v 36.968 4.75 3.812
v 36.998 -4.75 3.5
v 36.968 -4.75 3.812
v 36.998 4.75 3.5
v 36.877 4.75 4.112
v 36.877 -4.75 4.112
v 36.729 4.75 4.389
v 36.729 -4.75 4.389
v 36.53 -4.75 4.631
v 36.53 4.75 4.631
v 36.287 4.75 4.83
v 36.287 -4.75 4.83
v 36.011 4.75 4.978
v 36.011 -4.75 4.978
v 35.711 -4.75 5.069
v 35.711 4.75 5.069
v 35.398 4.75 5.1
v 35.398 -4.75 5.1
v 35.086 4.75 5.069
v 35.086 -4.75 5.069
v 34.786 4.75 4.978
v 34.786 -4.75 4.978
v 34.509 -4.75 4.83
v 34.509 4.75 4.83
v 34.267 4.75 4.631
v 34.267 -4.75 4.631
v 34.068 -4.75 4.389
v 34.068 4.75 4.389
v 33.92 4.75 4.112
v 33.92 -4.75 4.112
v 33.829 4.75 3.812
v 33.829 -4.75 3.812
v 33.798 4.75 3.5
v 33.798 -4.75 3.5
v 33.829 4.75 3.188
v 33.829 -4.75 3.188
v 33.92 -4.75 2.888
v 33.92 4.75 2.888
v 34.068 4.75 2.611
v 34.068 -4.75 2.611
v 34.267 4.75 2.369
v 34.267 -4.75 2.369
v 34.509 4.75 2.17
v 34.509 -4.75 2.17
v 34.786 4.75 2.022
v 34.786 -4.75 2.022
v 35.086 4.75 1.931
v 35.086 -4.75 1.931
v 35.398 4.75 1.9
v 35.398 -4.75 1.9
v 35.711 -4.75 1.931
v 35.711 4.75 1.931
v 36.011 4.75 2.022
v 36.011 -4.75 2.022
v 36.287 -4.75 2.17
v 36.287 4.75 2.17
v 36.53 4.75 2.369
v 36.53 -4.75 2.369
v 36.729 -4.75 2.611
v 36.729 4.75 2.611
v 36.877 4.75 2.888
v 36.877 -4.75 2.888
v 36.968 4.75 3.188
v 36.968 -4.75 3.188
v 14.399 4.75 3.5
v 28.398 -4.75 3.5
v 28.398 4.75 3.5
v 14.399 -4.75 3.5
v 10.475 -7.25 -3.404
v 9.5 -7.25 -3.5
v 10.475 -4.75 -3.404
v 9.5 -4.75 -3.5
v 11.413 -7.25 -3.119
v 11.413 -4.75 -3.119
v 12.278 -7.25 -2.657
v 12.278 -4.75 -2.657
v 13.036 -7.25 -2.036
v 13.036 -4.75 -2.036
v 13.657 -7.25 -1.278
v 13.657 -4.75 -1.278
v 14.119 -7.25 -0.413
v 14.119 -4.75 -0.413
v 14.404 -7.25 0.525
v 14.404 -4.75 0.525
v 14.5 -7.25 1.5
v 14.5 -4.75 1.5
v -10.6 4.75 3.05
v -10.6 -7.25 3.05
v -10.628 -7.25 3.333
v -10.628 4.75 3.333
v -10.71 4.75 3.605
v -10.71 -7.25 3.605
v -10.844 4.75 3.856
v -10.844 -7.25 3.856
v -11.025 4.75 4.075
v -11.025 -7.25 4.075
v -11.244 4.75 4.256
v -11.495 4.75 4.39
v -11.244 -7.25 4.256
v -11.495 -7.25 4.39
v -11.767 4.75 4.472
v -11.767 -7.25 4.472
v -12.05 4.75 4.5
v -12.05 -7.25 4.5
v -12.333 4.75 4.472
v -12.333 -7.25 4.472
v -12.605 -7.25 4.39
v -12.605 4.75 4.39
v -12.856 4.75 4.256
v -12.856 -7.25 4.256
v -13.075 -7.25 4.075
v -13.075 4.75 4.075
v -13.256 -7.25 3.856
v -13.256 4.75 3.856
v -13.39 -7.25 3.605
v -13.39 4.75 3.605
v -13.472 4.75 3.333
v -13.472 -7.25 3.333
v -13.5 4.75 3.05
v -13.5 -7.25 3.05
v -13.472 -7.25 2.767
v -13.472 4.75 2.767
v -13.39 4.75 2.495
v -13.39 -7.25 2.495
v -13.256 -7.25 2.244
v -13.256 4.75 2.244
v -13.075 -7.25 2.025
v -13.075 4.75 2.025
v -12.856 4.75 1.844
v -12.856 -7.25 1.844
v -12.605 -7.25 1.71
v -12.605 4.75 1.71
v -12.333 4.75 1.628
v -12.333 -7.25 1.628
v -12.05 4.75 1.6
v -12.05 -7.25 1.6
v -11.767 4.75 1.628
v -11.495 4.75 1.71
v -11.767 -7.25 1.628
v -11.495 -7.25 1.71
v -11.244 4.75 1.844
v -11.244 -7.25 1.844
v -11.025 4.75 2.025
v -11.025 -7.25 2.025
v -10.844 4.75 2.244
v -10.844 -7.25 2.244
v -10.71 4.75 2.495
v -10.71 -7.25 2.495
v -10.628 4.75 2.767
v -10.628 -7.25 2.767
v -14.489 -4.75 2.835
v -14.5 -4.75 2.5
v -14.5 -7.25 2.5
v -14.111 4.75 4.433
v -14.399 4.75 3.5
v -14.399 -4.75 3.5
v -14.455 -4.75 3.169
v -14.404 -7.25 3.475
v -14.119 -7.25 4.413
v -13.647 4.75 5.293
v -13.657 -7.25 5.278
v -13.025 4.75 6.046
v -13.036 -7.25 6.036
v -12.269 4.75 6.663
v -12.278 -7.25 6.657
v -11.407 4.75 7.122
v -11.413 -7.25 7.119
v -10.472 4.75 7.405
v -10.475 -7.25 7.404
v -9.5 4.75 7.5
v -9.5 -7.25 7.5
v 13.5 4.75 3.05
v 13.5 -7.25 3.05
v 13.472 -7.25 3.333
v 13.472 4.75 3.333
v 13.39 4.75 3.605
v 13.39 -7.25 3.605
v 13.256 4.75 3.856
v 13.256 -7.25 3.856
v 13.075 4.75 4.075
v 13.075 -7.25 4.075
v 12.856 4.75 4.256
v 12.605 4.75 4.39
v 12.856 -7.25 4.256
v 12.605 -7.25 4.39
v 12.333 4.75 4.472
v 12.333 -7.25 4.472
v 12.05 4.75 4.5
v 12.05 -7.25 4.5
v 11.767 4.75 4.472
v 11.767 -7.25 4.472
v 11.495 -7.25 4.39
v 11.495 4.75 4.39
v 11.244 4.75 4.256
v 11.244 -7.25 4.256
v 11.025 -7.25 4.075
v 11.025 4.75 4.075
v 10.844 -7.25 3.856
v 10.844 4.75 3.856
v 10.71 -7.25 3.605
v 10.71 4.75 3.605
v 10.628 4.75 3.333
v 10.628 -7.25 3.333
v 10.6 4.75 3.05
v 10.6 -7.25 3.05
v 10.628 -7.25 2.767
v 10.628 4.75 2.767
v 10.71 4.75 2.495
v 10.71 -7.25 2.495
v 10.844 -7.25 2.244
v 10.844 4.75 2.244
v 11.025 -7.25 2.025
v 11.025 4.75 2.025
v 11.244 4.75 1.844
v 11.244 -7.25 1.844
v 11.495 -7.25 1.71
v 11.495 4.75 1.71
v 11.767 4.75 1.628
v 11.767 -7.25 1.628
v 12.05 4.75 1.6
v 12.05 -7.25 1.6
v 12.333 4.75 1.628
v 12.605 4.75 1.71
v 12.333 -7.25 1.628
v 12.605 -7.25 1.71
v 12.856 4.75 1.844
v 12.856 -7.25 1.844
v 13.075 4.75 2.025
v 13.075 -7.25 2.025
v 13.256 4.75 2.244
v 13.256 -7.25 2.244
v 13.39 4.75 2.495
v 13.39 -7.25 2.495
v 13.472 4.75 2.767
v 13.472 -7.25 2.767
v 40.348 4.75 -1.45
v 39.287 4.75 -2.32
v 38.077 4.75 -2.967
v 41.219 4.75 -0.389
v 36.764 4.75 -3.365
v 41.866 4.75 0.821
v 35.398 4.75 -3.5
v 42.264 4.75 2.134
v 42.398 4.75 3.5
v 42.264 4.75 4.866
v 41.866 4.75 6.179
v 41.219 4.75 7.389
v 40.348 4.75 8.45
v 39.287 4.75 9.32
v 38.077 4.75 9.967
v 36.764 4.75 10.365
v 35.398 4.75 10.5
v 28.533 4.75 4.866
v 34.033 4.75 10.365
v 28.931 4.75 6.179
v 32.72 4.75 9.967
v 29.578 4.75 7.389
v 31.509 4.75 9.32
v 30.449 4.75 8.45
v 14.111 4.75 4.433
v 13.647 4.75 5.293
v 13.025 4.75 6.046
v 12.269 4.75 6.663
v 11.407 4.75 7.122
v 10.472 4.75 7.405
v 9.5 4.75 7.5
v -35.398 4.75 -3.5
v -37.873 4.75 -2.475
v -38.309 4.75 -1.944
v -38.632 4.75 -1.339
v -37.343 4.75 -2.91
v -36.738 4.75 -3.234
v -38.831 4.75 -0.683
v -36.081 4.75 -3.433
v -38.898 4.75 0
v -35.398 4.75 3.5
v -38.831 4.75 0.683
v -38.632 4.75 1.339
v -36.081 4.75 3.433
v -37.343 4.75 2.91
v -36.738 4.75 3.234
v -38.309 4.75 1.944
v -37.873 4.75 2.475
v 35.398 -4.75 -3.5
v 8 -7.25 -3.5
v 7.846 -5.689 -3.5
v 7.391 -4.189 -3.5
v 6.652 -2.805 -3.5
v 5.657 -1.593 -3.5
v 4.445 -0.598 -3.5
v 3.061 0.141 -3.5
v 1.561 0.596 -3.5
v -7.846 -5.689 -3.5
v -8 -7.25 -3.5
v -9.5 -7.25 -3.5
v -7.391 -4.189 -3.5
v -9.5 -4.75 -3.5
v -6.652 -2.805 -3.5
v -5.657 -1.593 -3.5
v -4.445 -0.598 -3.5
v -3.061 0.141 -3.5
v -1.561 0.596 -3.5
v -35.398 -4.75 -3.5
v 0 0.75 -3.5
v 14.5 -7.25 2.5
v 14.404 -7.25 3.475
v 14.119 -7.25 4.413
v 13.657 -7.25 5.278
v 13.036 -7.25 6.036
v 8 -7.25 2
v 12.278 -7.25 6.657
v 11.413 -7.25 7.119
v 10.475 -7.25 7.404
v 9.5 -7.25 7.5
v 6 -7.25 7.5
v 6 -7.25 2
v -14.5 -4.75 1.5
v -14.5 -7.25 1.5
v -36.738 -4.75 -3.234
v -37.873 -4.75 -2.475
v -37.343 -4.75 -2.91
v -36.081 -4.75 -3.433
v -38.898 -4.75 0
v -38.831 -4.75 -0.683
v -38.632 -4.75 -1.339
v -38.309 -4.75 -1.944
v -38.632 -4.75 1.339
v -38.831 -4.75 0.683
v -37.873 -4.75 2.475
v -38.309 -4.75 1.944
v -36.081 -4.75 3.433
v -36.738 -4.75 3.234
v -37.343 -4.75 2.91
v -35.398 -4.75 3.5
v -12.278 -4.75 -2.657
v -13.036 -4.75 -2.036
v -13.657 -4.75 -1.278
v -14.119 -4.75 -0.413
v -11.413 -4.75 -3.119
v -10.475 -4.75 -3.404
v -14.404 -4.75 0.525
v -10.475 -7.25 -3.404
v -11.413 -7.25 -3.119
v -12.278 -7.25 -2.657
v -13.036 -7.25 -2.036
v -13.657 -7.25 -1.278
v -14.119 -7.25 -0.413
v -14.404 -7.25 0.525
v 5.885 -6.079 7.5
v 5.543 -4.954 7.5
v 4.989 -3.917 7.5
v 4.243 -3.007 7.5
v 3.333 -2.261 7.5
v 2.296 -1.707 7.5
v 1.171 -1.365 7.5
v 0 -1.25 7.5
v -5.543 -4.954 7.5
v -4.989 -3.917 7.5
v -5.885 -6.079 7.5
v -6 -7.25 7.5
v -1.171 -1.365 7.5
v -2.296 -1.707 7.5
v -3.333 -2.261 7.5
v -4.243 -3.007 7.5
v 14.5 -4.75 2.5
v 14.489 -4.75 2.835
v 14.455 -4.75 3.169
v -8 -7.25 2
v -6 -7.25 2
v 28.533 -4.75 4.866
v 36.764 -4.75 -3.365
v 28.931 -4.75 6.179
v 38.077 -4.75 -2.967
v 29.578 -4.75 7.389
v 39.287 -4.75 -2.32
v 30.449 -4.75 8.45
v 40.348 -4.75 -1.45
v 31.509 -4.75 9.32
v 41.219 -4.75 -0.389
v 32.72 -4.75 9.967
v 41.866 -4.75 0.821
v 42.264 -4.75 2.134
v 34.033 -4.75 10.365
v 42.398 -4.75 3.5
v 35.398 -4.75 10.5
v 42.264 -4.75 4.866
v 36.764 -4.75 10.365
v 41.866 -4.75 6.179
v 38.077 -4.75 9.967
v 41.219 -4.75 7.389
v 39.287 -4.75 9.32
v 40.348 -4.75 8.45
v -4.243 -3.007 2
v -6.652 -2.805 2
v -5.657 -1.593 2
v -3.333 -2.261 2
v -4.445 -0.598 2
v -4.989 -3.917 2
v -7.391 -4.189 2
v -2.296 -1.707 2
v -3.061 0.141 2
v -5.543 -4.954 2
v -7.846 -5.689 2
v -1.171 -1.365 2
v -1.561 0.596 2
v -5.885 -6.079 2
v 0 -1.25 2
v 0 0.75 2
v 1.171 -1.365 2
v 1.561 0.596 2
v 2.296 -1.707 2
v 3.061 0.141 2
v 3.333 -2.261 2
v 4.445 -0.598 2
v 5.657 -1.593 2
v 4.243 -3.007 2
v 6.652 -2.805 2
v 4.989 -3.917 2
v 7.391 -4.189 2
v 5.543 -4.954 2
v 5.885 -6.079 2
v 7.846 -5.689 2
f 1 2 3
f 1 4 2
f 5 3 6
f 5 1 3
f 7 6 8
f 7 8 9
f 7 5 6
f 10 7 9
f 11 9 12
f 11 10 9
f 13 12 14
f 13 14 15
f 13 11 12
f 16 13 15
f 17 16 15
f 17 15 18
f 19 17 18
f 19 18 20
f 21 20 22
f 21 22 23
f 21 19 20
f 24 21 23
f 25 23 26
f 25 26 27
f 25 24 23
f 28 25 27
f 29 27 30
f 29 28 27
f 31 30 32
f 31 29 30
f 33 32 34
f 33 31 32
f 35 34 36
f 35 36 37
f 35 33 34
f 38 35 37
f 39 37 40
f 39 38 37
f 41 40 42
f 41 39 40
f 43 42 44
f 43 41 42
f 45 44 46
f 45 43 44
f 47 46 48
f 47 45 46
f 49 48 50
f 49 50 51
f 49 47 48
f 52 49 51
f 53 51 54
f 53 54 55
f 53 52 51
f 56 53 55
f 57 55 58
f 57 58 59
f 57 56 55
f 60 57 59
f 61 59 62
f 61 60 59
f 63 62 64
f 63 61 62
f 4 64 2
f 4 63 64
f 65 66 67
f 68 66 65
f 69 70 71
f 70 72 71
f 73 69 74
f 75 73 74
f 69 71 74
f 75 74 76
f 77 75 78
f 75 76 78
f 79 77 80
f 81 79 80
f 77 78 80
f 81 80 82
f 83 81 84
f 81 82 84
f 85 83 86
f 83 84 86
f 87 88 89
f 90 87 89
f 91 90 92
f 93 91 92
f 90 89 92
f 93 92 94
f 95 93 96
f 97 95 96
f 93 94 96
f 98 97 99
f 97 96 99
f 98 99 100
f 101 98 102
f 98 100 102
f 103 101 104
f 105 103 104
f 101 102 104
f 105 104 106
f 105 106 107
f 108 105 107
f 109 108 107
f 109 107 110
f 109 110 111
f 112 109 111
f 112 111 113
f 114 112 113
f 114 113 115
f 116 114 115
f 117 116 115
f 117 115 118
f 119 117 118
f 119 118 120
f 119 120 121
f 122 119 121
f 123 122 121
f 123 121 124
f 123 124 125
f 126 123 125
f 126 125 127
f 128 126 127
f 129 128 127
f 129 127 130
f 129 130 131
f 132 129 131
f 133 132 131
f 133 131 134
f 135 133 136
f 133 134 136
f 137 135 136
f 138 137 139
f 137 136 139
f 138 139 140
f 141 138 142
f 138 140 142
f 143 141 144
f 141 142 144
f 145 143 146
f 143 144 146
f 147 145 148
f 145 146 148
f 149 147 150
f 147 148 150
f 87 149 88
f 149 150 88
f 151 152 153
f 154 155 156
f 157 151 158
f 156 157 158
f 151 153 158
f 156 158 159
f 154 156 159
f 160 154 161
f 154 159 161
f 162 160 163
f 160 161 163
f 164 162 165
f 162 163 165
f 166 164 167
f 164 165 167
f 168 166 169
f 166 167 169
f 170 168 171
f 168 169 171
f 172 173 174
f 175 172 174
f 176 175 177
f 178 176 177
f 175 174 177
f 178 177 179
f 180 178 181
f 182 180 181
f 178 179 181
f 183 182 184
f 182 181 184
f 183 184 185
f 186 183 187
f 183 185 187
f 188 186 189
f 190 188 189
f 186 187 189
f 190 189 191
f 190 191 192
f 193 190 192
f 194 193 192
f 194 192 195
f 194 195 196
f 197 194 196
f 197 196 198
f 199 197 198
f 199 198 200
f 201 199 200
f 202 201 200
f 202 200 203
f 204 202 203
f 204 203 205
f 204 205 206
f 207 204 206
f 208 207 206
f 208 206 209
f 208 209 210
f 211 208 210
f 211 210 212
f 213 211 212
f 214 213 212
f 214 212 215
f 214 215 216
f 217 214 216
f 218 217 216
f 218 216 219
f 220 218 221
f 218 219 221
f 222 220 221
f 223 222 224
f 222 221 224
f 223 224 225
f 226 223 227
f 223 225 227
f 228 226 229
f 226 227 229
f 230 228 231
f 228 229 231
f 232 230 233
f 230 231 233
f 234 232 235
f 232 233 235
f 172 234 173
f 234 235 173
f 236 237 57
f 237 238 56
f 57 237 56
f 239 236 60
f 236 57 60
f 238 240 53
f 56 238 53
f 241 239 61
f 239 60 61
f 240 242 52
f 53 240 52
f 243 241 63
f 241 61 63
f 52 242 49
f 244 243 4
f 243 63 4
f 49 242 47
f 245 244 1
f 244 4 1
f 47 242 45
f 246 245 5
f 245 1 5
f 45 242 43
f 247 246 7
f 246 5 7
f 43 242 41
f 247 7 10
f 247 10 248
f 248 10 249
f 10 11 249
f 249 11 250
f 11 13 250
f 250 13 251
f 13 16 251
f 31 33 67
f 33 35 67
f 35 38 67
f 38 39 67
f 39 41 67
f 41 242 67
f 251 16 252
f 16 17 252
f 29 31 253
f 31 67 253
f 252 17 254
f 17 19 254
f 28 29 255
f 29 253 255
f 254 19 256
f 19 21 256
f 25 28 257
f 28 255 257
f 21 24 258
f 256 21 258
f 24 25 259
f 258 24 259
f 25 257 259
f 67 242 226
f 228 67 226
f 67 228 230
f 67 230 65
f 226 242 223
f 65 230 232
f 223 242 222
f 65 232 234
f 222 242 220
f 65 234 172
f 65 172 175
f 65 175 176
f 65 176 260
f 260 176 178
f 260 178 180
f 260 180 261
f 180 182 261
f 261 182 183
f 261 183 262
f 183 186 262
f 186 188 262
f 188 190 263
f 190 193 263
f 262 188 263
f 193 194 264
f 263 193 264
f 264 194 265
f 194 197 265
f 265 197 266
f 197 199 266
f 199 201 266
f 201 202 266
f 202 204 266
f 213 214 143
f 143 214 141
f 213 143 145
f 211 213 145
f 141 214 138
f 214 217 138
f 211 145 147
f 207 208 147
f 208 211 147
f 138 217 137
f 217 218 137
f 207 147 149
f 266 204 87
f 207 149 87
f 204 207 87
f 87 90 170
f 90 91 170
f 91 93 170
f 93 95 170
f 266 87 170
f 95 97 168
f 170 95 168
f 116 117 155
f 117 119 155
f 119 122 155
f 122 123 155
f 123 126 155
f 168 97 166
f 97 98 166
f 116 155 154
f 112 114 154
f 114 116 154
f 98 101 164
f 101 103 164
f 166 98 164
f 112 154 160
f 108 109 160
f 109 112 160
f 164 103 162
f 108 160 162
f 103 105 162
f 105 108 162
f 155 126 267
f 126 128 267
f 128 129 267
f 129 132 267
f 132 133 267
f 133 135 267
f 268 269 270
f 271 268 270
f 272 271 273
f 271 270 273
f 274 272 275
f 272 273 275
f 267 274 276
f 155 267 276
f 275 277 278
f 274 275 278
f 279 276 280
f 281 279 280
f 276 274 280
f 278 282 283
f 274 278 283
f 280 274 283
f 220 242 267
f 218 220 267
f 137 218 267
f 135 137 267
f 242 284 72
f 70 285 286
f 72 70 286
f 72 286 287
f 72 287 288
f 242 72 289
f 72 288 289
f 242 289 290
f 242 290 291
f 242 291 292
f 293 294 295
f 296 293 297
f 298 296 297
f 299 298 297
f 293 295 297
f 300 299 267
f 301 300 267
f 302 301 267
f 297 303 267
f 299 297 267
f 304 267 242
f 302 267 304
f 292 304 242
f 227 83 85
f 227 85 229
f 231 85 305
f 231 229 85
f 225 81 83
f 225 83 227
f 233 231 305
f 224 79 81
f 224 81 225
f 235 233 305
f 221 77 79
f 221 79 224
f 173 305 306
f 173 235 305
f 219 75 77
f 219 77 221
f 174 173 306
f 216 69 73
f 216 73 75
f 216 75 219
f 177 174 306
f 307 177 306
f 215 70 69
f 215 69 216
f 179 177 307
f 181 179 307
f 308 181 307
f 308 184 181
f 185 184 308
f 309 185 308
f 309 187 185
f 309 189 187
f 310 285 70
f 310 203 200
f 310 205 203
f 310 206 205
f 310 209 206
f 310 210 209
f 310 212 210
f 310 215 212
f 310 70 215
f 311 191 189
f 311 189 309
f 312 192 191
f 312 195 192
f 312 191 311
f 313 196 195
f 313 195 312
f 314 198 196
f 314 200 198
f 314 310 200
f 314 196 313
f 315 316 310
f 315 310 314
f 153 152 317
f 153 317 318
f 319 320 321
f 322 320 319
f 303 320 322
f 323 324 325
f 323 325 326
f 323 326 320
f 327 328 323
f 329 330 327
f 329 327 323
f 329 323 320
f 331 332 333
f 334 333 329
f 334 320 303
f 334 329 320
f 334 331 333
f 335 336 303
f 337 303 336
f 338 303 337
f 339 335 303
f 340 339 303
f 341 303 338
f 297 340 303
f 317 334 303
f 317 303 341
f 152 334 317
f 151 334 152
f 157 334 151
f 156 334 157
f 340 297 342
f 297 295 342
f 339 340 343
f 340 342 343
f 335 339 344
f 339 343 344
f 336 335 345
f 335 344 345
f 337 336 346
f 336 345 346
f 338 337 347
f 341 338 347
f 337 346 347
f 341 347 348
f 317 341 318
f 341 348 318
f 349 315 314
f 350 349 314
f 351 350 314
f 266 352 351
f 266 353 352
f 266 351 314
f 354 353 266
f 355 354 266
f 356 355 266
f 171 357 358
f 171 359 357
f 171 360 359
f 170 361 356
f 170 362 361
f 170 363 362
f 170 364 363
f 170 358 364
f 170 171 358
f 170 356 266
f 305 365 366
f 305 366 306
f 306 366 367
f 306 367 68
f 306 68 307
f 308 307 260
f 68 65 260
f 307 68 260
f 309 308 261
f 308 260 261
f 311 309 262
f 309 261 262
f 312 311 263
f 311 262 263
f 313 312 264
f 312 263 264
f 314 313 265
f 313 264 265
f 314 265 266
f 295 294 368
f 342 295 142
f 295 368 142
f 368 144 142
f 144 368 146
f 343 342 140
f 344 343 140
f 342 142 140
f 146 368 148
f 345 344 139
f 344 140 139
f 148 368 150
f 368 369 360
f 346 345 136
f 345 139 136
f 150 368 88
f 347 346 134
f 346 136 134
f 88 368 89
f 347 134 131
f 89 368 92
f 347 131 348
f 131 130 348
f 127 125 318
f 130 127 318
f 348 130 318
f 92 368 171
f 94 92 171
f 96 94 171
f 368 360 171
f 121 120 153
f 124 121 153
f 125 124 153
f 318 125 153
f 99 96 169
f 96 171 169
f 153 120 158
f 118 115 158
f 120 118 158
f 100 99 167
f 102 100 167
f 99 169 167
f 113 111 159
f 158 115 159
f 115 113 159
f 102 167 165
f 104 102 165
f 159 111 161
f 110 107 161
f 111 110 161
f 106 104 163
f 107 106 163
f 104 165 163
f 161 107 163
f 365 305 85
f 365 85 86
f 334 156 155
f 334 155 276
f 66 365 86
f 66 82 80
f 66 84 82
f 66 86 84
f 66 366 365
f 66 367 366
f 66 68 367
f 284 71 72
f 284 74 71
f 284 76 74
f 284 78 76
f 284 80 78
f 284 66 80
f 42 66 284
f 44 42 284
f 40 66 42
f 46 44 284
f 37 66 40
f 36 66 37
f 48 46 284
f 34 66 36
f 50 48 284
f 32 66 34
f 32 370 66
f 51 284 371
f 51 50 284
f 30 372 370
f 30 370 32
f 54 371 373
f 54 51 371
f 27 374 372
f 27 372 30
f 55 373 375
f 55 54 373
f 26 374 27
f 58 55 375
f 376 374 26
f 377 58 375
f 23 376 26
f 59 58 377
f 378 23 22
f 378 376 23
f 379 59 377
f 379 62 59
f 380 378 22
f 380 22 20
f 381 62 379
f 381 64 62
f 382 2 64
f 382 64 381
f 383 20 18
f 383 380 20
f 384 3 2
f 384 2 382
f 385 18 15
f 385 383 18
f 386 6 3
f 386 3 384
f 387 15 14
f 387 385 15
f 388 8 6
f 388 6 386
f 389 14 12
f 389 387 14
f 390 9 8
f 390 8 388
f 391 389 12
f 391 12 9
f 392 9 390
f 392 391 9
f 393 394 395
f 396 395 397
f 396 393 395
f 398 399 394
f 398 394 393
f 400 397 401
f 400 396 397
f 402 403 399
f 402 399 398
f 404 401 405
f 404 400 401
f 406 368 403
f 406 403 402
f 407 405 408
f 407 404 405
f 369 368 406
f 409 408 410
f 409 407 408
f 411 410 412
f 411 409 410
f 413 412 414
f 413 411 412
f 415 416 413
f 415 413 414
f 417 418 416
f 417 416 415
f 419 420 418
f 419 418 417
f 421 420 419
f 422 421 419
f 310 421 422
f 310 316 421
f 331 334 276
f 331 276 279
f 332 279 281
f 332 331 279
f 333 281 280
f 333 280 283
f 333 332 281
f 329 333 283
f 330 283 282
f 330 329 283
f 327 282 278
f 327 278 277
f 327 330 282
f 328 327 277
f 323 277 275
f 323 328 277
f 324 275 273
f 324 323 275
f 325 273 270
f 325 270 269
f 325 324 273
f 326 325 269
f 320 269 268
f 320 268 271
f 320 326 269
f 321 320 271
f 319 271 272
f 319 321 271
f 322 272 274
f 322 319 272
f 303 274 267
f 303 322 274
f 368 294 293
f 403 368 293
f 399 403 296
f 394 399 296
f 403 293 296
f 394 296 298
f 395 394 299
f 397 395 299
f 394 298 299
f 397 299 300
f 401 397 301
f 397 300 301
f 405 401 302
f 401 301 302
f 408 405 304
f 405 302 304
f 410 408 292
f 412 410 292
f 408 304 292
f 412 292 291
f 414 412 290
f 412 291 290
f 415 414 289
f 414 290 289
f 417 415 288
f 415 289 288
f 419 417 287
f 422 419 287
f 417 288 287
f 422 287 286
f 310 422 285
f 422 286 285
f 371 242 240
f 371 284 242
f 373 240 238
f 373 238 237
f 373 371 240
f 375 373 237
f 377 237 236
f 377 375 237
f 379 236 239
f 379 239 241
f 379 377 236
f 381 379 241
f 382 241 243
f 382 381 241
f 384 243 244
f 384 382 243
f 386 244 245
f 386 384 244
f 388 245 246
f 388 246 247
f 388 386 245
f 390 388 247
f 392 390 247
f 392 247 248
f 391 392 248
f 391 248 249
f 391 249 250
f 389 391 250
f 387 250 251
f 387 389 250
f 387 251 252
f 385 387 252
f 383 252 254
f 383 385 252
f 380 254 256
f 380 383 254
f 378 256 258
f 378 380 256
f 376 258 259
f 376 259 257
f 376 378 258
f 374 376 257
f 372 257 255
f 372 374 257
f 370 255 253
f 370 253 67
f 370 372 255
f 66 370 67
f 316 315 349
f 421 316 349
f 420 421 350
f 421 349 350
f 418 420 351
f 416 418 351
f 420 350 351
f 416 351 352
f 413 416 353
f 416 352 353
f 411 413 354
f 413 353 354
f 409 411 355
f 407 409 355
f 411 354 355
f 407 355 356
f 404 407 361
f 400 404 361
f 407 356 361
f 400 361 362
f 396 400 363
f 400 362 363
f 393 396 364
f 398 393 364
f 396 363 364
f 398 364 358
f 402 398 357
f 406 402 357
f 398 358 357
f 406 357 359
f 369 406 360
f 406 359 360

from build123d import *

# Parameters (mm, degrees)
F0_R      = 1.6
F1_DEPTH  = 4.75
F2_W      = 25
F2_H      = 11
F3_DEPTH  = 12
F5_DEPTH  = 6
F7_DEPTH  = 5.5
F8_W      = 12
F8_H      = 11
F9_DEPTH  = 2
F10_W     = 12
F10_H     = 11
F11_DEPTH = 2
F12_R     = 1.45
F14_DEPTH = 25
F13_R     = 1.45
F15_DEPTH = 25
F16_R     = 5


with BuildPart() as f1:
    # F0 (on Front) → F1 (new body, symmetric)
    with BuildSketch(Plane.XZ):
        with BuildLine():
            ThreePointArc((35.398387, -3.5), (40.348135, 8.449747), (28.398387, 3.5))
            Line((28.398387, 3.5), (-35.398387, 3.5))
            ThreePointArc((-35.398387, 3.5), (-38.898387, 0), (-35.398387, -3.5))
            Line((-35.398387, -3.5), (35.398387, -3.5))
        make_face()
        with Locations((35.398387, 3.5)):
            Circle(F0_R, mode=Mode.SUBTRACT)
    extrude(amount=F1_DEPTH, both=True)

    # F2 (on face) → F3 (join)
    with BuildSketch(Plane(origin=(0, 4.75, 0), x_dir=(-1, 0, 0), z_dir=(0, 1, 0))):
        with Locations((0, 2)):
            Rectangle(F2_W, F2_H)
    extrude(amount=-F3_DEPTH)

    # F4 (on face) → F5 (cut)
    with BuildSketch(Plane.XY.offset(7.5)):
        with BuildLine():
            Line((-6, -7.25), (6, -7.25))
            ThreePointArc((6, -7.25), (0, -1.25), (-6, -7.25))
        make_face()
        with BuildLine():
            ThreePointArc((-6, -7.25), (0, -13.25), (6, -7.25))
            Line((6, -7.25), (-6, -7.25))
        make_face()
    extrude(amount=-F5_DEPTH, mode=Mode.SUBTRACT)

    # F6 (on face) → F7 (cut)
    with BuildSketch(Plane(origin=(0, 0, -3.5), x_dir=(1, 0, 0), z_dir=(0, 0, -1))):
        with BuildLine():
            Line((-8, 7.25), (8, 7.25))
            ThreePointArc((8, 7.25), (0, 15.25), (-8, 7.25))
        make_face()
        with BuildLine():
            ThreePointArc((-8, 7.25), (0, -0.75), (8, 7.25))
            Line((8, 7.25), (-8, 7.25))
        make_face()
    extrude(amount=-F7_DEPTH, mode=Mode.SUBTRACT)

    # F8 (on face) → F9 (join)
    with BuildSketch(Plane.YZ.offset(12.5)):
        with Locations((-1.25, 2)):
            Rectangle(F8_W, F8_H)
    extrude(amount=F9_DEPTH)

    # F10 (on face) → F11 (join)
    with BuildSketch(Plane(origin=(-12.5, 0, 0), x_dir=(0, -1, 0), z_dir=(-1, 0, 0))):
        with Locations((1.25, 2)):
            Rectangle(F10_W, F10_H)
    extrude(amount=F11_DEPTH)

    # F12 (on face) → F14 (cut)
    with BuildSketch(Plane.XZ.offset(7.25)):
        with Locations((-12.05, 3.05)):
            Circle(F12_R)
    extrude(amount=-F14_DEPTH, mode=Mode.SUBTRACT)

    # F13 (on face) → F15 (cut)
    with BuildSketch(Plane.XZ.offset(7.25)):
        with Locations((12.05, 3.05)):
            Circle(F13_R)
    extrude(amount=-F15_DEPTH, mode=Mode.SUBTRACT)

    # F16
    f16_edges = [f1.edges().sort_by_distance(p)[0] for p in [
        (-14.5, -6, -3.5),
        (-14.5, -1.25, 7.5),
        (14.5, -6, -3.5),
        (14.5, -1.25, 7.5),
    ]]
    fillet(f16_edges, radius=F16_R)


solid = f1.part
